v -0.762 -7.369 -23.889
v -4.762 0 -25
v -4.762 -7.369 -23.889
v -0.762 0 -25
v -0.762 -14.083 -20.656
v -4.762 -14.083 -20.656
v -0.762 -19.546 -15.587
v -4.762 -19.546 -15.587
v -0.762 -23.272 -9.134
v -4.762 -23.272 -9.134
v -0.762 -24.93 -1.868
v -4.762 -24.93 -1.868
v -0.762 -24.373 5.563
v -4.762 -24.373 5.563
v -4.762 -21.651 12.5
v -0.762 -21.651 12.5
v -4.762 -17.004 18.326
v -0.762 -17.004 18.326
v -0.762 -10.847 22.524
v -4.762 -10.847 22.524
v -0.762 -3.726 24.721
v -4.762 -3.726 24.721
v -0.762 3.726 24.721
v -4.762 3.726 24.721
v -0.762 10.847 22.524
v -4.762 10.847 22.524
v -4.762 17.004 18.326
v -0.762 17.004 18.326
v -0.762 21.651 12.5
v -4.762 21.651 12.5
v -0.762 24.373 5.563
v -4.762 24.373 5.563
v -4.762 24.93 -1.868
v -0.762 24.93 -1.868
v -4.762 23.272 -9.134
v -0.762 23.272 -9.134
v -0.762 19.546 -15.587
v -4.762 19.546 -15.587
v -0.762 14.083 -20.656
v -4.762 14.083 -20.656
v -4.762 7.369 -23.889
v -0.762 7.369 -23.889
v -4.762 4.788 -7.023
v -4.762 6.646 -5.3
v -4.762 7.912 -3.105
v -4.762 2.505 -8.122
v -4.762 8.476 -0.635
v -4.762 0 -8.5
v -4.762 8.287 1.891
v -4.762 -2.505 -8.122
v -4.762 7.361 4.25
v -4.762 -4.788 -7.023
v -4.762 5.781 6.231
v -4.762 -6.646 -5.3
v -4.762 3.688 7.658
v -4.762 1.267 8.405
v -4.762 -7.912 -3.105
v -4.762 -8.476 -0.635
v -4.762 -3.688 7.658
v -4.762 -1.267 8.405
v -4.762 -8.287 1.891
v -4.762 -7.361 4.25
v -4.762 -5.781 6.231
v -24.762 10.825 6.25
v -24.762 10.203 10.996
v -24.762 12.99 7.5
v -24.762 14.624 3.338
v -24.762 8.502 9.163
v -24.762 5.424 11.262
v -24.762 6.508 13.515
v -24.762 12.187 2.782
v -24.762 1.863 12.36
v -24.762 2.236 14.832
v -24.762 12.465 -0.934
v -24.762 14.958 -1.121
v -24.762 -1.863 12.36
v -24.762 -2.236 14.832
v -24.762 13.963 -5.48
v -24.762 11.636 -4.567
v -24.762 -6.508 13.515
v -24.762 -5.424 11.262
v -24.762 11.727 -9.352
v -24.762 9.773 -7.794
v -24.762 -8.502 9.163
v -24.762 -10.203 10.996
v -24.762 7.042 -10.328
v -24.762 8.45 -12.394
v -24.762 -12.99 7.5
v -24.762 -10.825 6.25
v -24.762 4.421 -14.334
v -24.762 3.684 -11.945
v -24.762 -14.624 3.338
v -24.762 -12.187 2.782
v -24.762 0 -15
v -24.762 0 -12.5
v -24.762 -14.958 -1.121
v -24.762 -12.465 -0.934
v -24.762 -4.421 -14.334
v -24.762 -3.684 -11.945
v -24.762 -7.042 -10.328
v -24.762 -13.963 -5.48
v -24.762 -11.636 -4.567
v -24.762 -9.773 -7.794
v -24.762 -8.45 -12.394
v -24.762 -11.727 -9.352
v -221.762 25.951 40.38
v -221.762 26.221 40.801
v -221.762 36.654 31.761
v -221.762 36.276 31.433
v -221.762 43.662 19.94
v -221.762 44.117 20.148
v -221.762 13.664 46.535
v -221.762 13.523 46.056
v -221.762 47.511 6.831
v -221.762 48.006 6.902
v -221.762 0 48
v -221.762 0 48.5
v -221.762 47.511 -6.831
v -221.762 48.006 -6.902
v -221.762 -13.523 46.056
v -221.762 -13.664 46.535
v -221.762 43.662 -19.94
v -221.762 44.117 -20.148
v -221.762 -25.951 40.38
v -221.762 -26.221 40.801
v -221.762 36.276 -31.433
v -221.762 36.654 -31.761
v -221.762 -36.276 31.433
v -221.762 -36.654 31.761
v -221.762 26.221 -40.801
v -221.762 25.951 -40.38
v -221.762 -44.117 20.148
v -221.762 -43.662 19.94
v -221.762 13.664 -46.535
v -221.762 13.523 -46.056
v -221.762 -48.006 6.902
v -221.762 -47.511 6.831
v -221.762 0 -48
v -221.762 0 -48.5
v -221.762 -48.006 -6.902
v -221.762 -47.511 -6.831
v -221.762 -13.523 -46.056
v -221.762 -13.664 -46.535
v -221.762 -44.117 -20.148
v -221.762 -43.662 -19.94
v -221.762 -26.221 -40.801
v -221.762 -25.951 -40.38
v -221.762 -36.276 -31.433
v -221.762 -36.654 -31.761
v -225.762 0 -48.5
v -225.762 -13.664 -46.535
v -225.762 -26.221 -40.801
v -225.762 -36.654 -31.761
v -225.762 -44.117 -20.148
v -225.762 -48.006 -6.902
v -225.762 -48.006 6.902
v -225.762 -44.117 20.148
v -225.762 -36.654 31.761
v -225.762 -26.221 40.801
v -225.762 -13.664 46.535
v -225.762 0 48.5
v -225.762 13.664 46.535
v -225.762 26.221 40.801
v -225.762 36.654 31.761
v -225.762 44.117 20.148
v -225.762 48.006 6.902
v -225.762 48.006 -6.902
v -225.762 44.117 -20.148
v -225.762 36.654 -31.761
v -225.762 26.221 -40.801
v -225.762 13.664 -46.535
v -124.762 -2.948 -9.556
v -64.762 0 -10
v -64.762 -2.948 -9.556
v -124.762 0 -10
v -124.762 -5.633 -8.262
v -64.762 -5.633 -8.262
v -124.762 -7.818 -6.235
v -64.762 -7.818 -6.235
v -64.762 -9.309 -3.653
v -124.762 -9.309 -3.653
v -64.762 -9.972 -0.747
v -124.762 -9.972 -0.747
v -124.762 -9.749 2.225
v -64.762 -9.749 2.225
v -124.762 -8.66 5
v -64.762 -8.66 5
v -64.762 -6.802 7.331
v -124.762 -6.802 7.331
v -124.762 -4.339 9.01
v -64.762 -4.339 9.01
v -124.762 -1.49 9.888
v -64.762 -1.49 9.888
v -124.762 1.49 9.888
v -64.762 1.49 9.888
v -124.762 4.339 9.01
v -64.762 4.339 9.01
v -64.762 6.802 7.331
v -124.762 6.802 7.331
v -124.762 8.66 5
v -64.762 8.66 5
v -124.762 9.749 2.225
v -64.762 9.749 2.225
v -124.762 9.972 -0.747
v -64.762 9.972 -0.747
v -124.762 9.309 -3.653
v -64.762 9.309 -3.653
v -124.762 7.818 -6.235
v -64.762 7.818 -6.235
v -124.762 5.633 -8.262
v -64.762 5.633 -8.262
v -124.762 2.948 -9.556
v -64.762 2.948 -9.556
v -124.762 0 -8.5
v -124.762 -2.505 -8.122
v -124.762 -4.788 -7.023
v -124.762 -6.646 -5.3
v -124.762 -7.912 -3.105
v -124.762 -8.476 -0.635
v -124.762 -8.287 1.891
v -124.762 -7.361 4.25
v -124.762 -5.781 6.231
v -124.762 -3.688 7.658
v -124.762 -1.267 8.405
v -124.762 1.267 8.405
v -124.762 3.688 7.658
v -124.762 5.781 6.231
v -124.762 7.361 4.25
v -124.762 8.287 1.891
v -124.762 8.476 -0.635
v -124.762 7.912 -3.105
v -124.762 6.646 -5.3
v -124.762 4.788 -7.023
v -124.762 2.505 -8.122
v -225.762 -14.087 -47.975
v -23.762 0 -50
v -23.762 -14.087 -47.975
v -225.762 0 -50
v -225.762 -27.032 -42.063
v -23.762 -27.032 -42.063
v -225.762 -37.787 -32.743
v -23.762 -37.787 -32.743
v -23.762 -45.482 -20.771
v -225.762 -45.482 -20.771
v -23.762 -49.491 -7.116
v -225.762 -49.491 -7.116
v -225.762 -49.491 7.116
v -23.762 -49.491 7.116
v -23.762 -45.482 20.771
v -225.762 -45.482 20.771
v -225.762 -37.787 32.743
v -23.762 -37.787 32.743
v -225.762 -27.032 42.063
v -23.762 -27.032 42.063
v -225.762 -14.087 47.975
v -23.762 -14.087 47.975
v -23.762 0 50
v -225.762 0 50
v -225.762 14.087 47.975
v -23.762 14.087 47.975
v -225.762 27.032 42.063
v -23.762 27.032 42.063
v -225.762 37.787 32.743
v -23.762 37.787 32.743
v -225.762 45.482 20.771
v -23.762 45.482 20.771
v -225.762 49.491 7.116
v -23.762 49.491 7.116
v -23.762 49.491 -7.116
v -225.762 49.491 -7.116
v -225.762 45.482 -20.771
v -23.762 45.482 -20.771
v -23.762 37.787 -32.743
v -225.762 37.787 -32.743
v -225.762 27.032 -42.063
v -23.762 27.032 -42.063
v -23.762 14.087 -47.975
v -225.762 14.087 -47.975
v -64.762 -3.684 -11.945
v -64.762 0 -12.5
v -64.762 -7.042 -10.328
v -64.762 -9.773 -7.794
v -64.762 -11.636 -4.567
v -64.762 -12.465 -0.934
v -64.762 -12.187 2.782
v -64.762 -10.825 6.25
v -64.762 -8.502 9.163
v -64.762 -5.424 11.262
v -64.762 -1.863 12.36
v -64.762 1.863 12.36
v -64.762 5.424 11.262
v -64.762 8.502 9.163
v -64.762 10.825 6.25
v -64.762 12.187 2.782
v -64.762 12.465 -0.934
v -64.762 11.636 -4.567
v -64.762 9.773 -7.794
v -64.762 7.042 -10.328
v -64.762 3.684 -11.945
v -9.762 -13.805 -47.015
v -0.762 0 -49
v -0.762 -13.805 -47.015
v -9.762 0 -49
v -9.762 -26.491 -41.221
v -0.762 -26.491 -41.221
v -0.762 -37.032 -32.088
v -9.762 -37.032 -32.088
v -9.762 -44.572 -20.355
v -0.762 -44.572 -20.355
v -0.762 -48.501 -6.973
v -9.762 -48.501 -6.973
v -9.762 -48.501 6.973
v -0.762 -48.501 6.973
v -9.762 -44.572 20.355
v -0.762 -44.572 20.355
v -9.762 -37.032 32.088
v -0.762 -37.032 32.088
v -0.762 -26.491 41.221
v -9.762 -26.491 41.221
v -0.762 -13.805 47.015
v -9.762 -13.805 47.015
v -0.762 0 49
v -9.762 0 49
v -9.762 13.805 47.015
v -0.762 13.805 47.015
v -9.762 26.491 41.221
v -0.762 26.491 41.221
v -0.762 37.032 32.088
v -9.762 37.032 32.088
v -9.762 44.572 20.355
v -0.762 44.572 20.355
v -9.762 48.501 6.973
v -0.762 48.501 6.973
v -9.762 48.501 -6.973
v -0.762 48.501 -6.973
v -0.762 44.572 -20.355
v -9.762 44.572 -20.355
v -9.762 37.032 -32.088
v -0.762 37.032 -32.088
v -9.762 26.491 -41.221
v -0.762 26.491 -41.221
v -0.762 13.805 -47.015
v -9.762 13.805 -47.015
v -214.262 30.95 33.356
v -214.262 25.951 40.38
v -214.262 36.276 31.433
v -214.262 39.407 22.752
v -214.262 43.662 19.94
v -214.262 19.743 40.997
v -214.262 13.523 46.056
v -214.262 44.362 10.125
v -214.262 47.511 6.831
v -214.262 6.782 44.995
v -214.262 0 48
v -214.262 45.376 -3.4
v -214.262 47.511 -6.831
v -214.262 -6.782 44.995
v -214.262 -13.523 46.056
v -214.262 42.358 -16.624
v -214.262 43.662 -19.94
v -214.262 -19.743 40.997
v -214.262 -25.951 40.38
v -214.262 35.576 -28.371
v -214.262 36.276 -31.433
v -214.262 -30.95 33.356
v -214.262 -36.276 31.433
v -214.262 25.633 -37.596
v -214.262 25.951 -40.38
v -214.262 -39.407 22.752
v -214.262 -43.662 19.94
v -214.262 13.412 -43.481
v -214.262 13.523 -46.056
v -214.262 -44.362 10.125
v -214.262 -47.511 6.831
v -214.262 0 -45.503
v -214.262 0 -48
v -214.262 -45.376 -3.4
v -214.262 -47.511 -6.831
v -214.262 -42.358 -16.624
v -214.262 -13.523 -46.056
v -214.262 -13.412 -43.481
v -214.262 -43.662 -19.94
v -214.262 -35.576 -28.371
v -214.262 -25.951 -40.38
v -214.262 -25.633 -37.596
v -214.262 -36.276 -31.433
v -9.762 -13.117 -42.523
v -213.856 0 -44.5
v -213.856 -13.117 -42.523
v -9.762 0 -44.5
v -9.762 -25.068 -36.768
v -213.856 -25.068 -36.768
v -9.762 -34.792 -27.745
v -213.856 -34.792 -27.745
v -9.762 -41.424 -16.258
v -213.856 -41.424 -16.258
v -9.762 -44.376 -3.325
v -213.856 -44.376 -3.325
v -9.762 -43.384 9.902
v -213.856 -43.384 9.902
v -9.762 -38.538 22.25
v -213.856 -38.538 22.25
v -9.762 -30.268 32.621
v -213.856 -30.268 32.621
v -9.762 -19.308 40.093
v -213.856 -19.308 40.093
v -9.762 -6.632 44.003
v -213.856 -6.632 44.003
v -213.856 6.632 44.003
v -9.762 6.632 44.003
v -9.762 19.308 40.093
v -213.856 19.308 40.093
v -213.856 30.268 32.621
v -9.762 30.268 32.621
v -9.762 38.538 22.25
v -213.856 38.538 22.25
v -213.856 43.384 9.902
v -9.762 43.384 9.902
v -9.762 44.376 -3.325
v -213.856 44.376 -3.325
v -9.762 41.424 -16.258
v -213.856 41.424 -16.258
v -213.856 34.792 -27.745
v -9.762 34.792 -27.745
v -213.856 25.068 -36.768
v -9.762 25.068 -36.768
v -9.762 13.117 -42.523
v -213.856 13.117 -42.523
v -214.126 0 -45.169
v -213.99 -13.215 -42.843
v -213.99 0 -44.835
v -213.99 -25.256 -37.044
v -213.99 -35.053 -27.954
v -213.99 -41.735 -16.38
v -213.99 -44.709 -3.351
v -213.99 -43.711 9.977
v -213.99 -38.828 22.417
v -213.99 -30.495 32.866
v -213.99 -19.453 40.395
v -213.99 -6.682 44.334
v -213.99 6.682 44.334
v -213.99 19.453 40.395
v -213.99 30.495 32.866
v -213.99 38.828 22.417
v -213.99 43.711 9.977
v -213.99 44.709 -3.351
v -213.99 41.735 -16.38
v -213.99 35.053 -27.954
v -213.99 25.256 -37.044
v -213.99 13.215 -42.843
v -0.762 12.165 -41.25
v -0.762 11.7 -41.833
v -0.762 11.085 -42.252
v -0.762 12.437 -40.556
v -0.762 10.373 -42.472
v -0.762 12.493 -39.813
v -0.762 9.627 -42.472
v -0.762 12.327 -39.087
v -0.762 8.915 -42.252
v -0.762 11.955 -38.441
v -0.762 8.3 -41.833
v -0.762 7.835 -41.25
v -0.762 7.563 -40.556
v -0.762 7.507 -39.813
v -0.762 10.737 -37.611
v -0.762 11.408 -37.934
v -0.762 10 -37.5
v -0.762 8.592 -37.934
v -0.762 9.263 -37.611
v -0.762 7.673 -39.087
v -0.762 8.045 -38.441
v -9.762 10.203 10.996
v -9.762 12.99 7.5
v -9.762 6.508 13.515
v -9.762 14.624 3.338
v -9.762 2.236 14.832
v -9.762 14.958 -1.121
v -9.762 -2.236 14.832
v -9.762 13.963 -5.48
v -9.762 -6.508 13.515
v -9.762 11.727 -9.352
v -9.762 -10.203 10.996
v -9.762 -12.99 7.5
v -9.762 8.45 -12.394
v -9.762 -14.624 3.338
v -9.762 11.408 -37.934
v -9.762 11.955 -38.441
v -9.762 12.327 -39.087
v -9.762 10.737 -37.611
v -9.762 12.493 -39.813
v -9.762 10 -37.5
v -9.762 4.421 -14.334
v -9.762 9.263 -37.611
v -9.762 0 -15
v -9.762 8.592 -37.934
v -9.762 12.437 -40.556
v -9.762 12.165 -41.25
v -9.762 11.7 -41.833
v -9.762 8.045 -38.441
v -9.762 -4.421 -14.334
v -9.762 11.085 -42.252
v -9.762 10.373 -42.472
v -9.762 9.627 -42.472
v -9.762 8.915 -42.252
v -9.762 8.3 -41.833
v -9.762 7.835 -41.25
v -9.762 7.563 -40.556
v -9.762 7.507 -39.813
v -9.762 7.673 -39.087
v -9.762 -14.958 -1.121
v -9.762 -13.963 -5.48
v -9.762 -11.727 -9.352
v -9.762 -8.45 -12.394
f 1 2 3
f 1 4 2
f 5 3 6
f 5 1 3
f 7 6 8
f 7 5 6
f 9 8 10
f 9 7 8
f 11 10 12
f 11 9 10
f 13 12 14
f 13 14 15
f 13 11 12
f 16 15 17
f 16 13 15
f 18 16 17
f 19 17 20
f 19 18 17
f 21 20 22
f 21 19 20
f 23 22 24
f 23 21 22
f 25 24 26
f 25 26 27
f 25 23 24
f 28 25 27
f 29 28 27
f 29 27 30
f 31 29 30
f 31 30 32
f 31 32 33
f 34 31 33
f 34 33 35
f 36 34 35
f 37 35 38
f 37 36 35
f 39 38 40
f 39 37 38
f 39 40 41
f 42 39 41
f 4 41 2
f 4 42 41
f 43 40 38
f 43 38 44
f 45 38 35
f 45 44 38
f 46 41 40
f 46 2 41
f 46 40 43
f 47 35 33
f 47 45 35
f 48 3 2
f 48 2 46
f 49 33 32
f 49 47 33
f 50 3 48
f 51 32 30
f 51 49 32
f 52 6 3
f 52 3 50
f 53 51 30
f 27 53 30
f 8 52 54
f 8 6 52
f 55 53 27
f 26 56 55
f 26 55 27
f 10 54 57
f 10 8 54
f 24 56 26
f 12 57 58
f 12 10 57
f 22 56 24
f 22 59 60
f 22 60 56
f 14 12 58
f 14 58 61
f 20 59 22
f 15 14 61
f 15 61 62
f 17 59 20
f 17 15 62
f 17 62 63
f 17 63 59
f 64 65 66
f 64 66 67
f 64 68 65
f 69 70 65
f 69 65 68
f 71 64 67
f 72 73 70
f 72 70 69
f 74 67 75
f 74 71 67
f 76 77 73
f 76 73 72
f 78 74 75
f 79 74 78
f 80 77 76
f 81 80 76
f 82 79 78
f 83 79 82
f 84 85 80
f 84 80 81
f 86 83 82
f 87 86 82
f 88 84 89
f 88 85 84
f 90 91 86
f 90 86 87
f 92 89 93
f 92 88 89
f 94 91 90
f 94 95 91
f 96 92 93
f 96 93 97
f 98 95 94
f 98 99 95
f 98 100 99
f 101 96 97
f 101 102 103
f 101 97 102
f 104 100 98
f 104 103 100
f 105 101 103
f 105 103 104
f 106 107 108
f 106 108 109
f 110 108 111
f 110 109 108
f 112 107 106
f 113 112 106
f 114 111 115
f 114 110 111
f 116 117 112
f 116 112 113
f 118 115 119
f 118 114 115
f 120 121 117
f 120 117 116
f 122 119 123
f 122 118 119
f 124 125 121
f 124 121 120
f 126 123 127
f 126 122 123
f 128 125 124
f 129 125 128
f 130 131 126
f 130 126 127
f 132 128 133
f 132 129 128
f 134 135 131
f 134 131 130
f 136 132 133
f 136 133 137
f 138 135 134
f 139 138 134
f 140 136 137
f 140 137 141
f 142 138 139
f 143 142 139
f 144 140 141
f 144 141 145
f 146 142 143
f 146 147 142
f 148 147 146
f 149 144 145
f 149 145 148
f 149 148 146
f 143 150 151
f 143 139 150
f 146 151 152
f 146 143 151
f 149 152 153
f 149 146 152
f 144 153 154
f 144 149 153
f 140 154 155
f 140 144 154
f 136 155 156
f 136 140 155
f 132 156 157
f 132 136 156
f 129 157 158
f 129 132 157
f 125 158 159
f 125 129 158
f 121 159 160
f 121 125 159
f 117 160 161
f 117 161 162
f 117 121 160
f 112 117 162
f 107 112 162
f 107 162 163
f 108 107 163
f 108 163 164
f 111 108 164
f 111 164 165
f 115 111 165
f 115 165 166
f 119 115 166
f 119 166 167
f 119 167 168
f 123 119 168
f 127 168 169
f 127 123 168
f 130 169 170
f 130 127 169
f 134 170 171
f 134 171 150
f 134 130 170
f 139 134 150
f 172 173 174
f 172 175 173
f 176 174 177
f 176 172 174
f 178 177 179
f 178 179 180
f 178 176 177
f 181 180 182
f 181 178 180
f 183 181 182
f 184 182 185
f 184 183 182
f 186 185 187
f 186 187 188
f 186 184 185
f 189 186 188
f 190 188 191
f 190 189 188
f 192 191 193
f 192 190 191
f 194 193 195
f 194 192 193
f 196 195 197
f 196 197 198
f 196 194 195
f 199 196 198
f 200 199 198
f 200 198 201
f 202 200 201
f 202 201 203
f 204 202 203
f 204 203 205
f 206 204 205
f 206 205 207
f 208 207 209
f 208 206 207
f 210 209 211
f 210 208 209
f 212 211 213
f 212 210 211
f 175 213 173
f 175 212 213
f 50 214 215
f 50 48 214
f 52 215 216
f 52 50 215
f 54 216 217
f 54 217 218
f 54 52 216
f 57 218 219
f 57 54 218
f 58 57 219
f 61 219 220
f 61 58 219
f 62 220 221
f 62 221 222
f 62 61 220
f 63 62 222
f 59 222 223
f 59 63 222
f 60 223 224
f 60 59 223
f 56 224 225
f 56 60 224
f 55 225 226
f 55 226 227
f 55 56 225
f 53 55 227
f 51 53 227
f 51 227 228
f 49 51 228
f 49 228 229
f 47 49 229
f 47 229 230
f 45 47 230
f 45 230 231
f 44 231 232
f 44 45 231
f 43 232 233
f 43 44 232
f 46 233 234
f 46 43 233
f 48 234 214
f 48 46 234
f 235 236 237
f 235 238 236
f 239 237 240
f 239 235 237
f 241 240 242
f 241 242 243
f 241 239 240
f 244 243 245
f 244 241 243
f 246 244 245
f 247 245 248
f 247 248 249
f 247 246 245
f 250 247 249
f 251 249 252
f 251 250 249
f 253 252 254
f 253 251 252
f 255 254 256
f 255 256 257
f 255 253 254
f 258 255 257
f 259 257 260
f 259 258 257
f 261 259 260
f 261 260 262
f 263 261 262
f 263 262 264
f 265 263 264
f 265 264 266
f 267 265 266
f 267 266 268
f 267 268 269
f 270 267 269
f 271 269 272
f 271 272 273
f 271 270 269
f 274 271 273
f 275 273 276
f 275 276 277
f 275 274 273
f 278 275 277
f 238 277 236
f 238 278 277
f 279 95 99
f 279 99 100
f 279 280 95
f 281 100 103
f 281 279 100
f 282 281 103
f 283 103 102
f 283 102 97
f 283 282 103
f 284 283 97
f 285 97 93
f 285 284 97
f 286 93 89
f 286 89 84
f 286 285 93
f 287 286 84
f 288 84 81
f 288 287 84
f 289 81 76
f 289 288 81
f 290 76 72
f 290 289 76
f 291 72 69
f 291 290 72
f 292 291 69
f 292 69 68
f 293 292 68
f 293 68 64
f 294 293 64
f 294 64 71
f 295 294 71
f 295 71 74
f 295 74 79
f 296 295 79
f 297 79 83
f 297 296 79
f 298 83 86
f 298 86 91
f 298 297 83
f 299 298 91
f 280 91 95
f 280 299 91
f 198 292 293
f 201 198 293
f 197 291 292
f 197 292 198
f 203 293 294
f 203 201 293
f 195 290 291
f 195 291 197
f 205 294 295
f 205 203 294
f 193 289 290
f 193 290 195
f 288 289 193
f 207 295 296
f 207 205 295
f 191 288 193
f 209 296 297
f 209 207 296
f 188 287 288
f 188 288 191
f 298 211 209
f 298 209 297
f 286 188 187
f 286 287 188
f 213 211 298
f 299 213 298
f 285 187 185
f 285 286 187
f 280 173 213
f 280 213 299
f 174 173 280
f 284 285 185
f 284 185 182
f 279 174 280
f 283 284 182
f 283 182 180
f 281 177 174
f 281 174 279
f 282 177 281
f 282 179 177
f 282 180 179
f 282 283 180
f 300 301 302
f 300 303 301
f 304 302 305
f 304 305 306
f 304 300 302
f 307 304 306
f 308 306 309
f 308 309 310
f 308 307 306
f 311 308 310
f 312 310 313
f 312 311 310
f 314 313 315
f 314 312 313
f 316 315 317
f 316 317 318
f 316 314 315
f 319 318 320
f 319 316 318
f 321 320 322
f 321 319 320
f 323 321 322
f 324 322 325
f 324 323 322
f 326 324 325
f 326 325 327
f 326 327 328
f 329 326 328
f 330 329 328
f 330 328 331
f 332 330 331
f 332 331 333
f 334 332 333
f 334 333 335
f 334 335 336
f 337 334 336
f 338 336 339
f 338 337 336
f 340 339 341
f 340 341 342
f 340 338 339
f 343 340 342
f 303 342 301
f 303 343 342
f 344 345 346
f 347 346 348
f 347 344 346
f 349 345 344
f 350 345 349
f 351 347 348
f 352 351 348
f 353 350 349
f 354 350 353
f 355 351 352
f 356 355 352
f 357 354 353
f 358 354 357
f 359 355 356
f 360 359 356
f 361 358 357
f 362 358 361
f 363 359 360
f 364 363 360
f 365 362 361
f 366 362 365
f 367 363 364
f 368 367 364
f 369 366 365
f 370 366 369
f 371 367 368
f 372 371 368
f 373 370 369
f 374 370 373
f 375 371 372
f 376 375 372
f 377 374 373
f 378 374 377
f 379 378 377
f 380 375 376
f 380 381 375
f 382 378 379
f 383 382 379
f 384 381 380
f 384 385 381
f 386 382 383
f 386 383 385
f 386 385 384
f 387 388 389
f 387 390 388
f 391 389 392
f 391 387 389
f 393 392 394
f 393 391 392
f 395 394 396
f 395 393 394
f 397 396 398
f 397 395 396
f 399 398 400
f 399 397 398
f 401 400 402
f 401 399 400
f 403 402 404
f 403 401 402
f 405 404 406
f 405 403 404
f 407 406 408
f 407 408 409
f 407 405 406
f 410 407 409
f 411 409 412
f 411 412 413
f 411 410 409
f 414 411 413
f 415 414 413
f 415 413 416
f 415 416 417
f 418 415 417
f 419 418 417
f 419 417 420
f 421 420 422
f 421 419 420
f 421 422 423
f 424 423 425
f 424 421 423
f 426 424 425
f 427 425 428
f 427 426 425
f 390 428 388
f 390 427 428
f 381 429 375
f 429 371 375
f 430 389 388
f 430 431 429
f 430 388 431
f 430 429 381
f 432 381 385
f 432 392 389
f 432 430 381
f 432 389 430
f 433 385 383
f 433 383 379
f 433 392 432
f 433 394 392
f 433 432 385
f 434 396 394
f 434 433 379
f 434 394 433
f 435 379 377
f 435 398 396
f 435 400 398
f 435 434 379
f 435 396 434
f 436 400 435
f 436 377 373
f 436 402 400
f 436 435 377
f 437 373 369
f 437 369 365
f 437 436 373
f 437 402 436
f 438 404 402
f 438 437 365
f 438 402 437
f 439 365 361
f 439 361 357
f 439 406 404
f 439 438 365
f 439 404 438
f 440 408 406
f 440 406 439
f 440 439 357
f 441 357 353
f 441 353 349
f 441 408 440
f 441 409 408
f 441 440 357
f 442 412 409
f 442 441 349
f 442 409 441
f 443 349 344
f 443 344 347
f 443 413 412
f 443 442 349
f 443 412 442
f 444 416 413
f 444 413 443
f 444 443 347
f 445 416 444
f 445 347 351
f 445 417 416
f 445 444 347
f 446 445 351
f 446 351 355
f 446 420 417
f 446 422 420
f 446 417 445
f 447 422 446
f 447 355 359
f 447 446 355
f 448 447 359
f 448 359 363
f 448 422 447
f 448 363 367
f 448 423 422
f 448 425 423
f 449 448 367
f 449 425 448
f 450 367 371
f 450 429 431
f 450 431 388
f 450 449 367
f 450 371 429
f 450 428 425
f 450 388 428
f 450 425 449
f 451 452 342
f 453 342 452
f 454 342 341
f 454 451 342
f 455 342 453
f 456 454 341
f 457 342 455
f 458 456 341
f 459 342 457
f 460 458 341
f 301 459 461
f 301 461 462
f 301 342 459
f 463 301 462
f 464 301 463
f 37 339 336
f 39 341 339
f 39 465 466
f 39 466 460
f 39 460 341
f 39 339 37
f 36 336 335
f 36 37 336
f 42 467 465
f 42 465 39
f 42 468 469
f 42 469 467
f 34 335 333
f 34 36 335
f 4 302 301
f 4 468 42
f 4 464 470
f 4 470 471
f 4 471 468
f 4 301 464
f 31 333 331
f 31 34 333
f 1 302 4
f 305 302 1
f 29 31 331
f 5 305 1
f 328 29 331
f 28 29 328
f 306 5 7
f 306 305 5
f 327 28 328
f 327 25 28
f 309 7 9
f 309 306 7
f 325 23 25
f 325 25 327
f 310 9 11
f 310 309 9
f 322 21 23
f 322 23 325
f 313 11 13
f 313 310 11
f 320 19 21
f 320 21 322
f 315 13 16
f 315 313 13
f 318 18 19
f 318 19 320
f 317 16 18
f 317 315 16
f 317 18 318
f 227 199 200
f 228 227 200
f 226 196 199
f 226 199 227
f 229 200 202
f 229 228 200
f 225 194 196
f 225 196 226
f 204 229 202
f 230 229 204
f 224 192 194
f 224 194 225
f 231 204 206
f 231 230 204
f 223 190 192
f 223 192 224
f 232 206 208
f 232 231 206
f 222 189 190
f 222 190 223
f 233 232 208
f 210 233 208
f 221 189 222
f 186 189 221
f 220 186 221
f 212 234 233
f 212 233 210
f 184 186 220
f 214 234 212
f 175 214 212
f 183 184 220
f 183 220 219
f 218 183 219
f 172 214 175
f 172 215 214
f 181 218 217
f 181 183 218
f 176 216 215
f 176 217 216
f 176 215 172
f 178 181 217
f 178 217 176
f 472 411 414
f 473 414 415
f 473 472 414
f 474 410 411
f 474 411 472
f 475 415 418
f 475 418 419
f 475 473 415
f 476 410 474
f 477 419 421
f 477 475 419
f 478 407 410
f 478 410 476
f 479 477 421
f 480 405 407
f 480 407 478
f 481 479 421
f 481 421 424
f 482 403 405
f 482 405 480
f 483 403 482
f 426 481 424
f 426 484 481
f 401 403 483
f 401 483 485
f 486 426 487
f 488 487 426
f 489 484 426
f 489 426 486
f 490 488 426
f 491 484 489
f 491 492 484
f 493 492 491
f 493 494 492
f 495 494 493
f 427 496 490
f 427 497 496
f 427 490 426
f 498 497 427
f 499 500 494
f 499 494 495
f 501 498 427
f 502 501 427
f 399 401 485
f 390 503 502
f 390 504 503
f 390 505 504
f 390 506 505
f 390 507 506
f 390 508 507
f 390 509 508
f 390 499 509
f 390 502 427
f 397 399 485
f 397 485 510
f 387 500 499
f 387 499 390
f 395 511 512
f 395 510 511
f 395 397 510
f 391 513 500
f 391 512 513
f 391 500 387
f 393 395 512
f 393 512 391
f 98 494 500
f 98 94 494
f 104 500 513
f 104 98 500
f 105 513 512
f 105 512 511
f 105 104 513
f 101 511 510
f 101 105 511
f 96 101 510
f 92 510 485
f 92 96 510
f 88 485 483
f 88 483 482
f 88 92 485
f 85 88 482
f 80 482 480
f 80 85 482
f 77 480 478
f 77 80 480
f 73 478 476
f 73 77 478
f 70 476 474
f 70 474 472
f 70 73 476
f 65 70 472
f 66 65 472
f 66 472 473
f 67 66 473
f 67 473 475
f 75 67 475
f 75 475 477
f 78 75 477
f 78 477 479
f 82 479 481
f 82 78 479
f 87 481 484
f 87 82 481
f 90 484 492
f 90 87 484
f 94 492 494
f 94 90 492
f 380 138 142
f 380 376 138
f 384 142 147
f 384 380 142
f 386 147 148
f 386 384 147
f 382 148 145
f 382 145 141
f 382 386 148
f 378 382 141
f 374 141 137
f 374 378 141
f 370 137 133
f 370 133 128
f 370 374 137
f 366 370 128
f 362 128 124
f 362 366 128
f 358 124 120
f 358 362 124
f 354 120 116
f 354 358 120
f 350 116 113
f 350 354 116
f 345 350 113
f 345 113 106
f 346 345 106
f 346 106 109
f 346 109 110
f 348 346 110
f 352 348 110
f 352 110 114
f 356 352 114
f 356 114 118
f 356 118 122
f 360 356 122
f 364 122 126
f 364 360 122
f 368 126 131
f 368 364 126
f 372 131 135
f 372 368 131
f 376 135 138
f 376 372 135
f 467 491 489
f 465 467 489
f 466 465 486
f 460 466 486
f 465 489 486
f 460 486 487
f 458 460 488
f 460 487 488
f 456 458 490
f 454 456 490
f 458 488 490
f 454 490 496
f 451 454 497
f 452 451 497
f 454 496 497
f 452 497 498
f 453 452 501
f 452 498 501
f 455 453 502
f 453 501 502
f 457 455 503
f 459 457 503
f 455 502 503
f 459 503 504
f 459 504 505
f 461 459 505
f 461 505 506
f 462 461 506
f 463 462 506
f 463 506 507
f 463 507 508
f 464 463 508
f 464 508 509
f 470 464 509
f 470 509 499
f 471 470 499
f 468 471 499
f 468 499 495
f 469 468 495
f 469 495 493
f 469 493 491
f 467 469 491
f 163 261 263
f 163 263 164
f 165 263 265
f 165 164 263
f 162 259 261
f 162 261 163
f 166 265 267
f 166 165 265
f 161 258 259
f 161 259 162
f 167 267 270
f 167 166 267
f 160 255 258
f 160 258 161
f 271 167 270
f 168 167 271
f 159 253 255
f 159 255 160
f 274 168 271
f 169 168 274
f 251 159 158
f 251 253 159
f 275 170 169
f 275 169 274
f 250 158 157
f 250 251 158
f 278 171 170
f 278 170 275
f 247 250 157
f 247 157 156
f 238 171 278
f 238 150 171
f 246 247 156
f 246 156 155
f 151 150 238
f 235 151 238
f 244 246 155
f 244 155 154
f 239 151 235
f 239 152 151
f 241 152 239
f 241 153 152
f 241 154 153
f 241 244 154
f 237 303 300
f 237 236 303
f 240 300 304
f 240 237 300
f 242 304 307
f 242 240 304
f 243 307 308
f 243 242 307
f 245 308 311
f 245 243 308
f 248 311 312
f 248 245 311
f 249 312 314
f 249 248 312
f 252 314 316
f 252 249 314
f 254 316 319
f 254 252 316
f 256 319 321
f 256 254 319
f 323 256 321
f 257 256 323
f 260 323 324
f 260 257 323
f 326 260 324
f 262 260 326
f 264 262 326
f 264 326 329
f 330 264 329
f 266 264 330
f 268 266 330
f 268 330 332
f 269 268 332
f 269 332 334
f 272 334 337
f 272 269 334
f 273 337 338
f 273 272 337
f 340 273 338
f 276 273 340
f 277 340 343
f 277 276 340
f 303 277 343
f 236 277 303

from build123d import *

# Parameters (mm, degrees)
TROU_TARAUD_M61_D = 5


with BuildPart() as part:
    # Esquisse1 → Révolution1 (revolve)
    with BuildSketch(Plane.XY, mode=Mode.PRIVATE) as r_volution1_sk:
        with BuildLine():
            Line((-0.761813432, 25), (-0.761813432, 49))
            Line((-0.761813432, 49), (-9.761813432, 49))
            Line((-9.761813432, 49), (-23.761813432, 50))
            Line((-23.761813432, 50), (-225.761813432, 50))
            Line((-225.761813432, 50), (-225.761813432, 48.5))
            Line((-225.761813432, 48.5), (-221.761813432, 48.5))
            Line((-221.761813432, 48.5), (-221.761813432, 48))
            Line((-221.761813432, 48), (-214.261813432, 48))
            Line((-214.261813432, 48), (-214.261813432, 45.503048629))
            ThreePointArc((-214.261813432, 45.503048629), (-214.05779592, 45.001981665), (-213.856039491, 44.5))
            Line((-213.856039491, 44.5), (-9.761813432, 44.5))
            Line((-9.761813432, 44.5), (-9.761813432, 15))
            Line((-9.761813432, 15), (-24.761813432, 15))
            Line((-24.761813432, 15), (-24.761813432, 12.5))
            Line((-24.761813432, 12.5), (-64.761813432, 12.5))
            Line((-64.761813432, 12.5), (-64.761813432, 10))
            Line((-64.761813432, 10), (-124.761813432, 10))
            Line((-124.761813432, 10), (-124.761813432, 8.5))
            Line((-124.761813432, 8.5), (-4.761813432, 8.5))
            Line((-4.761813432, 8.5), (-4.761813432, 25))
            Line((-4.761813432, 25), (-0.761813432, 25))
        make_face()
    revolve(r_volution1_sk.sketch.rotate(Axis((0, 0, 0), (-1, 0, 0)), 90), axis=Axis((0, 0, 0), (-1, 0, 0)))

    # Trou taraudé M61 (through all)
    with Locations(Plane(origin=(-0.761813432, 0, 0), x_dir=(0, 0, -1), z_dir=(1, 0, 0))):
        with Locations((40, 10)):
            Hole(TROU_TARAUD_M61_D / 2)


solid = part.part
